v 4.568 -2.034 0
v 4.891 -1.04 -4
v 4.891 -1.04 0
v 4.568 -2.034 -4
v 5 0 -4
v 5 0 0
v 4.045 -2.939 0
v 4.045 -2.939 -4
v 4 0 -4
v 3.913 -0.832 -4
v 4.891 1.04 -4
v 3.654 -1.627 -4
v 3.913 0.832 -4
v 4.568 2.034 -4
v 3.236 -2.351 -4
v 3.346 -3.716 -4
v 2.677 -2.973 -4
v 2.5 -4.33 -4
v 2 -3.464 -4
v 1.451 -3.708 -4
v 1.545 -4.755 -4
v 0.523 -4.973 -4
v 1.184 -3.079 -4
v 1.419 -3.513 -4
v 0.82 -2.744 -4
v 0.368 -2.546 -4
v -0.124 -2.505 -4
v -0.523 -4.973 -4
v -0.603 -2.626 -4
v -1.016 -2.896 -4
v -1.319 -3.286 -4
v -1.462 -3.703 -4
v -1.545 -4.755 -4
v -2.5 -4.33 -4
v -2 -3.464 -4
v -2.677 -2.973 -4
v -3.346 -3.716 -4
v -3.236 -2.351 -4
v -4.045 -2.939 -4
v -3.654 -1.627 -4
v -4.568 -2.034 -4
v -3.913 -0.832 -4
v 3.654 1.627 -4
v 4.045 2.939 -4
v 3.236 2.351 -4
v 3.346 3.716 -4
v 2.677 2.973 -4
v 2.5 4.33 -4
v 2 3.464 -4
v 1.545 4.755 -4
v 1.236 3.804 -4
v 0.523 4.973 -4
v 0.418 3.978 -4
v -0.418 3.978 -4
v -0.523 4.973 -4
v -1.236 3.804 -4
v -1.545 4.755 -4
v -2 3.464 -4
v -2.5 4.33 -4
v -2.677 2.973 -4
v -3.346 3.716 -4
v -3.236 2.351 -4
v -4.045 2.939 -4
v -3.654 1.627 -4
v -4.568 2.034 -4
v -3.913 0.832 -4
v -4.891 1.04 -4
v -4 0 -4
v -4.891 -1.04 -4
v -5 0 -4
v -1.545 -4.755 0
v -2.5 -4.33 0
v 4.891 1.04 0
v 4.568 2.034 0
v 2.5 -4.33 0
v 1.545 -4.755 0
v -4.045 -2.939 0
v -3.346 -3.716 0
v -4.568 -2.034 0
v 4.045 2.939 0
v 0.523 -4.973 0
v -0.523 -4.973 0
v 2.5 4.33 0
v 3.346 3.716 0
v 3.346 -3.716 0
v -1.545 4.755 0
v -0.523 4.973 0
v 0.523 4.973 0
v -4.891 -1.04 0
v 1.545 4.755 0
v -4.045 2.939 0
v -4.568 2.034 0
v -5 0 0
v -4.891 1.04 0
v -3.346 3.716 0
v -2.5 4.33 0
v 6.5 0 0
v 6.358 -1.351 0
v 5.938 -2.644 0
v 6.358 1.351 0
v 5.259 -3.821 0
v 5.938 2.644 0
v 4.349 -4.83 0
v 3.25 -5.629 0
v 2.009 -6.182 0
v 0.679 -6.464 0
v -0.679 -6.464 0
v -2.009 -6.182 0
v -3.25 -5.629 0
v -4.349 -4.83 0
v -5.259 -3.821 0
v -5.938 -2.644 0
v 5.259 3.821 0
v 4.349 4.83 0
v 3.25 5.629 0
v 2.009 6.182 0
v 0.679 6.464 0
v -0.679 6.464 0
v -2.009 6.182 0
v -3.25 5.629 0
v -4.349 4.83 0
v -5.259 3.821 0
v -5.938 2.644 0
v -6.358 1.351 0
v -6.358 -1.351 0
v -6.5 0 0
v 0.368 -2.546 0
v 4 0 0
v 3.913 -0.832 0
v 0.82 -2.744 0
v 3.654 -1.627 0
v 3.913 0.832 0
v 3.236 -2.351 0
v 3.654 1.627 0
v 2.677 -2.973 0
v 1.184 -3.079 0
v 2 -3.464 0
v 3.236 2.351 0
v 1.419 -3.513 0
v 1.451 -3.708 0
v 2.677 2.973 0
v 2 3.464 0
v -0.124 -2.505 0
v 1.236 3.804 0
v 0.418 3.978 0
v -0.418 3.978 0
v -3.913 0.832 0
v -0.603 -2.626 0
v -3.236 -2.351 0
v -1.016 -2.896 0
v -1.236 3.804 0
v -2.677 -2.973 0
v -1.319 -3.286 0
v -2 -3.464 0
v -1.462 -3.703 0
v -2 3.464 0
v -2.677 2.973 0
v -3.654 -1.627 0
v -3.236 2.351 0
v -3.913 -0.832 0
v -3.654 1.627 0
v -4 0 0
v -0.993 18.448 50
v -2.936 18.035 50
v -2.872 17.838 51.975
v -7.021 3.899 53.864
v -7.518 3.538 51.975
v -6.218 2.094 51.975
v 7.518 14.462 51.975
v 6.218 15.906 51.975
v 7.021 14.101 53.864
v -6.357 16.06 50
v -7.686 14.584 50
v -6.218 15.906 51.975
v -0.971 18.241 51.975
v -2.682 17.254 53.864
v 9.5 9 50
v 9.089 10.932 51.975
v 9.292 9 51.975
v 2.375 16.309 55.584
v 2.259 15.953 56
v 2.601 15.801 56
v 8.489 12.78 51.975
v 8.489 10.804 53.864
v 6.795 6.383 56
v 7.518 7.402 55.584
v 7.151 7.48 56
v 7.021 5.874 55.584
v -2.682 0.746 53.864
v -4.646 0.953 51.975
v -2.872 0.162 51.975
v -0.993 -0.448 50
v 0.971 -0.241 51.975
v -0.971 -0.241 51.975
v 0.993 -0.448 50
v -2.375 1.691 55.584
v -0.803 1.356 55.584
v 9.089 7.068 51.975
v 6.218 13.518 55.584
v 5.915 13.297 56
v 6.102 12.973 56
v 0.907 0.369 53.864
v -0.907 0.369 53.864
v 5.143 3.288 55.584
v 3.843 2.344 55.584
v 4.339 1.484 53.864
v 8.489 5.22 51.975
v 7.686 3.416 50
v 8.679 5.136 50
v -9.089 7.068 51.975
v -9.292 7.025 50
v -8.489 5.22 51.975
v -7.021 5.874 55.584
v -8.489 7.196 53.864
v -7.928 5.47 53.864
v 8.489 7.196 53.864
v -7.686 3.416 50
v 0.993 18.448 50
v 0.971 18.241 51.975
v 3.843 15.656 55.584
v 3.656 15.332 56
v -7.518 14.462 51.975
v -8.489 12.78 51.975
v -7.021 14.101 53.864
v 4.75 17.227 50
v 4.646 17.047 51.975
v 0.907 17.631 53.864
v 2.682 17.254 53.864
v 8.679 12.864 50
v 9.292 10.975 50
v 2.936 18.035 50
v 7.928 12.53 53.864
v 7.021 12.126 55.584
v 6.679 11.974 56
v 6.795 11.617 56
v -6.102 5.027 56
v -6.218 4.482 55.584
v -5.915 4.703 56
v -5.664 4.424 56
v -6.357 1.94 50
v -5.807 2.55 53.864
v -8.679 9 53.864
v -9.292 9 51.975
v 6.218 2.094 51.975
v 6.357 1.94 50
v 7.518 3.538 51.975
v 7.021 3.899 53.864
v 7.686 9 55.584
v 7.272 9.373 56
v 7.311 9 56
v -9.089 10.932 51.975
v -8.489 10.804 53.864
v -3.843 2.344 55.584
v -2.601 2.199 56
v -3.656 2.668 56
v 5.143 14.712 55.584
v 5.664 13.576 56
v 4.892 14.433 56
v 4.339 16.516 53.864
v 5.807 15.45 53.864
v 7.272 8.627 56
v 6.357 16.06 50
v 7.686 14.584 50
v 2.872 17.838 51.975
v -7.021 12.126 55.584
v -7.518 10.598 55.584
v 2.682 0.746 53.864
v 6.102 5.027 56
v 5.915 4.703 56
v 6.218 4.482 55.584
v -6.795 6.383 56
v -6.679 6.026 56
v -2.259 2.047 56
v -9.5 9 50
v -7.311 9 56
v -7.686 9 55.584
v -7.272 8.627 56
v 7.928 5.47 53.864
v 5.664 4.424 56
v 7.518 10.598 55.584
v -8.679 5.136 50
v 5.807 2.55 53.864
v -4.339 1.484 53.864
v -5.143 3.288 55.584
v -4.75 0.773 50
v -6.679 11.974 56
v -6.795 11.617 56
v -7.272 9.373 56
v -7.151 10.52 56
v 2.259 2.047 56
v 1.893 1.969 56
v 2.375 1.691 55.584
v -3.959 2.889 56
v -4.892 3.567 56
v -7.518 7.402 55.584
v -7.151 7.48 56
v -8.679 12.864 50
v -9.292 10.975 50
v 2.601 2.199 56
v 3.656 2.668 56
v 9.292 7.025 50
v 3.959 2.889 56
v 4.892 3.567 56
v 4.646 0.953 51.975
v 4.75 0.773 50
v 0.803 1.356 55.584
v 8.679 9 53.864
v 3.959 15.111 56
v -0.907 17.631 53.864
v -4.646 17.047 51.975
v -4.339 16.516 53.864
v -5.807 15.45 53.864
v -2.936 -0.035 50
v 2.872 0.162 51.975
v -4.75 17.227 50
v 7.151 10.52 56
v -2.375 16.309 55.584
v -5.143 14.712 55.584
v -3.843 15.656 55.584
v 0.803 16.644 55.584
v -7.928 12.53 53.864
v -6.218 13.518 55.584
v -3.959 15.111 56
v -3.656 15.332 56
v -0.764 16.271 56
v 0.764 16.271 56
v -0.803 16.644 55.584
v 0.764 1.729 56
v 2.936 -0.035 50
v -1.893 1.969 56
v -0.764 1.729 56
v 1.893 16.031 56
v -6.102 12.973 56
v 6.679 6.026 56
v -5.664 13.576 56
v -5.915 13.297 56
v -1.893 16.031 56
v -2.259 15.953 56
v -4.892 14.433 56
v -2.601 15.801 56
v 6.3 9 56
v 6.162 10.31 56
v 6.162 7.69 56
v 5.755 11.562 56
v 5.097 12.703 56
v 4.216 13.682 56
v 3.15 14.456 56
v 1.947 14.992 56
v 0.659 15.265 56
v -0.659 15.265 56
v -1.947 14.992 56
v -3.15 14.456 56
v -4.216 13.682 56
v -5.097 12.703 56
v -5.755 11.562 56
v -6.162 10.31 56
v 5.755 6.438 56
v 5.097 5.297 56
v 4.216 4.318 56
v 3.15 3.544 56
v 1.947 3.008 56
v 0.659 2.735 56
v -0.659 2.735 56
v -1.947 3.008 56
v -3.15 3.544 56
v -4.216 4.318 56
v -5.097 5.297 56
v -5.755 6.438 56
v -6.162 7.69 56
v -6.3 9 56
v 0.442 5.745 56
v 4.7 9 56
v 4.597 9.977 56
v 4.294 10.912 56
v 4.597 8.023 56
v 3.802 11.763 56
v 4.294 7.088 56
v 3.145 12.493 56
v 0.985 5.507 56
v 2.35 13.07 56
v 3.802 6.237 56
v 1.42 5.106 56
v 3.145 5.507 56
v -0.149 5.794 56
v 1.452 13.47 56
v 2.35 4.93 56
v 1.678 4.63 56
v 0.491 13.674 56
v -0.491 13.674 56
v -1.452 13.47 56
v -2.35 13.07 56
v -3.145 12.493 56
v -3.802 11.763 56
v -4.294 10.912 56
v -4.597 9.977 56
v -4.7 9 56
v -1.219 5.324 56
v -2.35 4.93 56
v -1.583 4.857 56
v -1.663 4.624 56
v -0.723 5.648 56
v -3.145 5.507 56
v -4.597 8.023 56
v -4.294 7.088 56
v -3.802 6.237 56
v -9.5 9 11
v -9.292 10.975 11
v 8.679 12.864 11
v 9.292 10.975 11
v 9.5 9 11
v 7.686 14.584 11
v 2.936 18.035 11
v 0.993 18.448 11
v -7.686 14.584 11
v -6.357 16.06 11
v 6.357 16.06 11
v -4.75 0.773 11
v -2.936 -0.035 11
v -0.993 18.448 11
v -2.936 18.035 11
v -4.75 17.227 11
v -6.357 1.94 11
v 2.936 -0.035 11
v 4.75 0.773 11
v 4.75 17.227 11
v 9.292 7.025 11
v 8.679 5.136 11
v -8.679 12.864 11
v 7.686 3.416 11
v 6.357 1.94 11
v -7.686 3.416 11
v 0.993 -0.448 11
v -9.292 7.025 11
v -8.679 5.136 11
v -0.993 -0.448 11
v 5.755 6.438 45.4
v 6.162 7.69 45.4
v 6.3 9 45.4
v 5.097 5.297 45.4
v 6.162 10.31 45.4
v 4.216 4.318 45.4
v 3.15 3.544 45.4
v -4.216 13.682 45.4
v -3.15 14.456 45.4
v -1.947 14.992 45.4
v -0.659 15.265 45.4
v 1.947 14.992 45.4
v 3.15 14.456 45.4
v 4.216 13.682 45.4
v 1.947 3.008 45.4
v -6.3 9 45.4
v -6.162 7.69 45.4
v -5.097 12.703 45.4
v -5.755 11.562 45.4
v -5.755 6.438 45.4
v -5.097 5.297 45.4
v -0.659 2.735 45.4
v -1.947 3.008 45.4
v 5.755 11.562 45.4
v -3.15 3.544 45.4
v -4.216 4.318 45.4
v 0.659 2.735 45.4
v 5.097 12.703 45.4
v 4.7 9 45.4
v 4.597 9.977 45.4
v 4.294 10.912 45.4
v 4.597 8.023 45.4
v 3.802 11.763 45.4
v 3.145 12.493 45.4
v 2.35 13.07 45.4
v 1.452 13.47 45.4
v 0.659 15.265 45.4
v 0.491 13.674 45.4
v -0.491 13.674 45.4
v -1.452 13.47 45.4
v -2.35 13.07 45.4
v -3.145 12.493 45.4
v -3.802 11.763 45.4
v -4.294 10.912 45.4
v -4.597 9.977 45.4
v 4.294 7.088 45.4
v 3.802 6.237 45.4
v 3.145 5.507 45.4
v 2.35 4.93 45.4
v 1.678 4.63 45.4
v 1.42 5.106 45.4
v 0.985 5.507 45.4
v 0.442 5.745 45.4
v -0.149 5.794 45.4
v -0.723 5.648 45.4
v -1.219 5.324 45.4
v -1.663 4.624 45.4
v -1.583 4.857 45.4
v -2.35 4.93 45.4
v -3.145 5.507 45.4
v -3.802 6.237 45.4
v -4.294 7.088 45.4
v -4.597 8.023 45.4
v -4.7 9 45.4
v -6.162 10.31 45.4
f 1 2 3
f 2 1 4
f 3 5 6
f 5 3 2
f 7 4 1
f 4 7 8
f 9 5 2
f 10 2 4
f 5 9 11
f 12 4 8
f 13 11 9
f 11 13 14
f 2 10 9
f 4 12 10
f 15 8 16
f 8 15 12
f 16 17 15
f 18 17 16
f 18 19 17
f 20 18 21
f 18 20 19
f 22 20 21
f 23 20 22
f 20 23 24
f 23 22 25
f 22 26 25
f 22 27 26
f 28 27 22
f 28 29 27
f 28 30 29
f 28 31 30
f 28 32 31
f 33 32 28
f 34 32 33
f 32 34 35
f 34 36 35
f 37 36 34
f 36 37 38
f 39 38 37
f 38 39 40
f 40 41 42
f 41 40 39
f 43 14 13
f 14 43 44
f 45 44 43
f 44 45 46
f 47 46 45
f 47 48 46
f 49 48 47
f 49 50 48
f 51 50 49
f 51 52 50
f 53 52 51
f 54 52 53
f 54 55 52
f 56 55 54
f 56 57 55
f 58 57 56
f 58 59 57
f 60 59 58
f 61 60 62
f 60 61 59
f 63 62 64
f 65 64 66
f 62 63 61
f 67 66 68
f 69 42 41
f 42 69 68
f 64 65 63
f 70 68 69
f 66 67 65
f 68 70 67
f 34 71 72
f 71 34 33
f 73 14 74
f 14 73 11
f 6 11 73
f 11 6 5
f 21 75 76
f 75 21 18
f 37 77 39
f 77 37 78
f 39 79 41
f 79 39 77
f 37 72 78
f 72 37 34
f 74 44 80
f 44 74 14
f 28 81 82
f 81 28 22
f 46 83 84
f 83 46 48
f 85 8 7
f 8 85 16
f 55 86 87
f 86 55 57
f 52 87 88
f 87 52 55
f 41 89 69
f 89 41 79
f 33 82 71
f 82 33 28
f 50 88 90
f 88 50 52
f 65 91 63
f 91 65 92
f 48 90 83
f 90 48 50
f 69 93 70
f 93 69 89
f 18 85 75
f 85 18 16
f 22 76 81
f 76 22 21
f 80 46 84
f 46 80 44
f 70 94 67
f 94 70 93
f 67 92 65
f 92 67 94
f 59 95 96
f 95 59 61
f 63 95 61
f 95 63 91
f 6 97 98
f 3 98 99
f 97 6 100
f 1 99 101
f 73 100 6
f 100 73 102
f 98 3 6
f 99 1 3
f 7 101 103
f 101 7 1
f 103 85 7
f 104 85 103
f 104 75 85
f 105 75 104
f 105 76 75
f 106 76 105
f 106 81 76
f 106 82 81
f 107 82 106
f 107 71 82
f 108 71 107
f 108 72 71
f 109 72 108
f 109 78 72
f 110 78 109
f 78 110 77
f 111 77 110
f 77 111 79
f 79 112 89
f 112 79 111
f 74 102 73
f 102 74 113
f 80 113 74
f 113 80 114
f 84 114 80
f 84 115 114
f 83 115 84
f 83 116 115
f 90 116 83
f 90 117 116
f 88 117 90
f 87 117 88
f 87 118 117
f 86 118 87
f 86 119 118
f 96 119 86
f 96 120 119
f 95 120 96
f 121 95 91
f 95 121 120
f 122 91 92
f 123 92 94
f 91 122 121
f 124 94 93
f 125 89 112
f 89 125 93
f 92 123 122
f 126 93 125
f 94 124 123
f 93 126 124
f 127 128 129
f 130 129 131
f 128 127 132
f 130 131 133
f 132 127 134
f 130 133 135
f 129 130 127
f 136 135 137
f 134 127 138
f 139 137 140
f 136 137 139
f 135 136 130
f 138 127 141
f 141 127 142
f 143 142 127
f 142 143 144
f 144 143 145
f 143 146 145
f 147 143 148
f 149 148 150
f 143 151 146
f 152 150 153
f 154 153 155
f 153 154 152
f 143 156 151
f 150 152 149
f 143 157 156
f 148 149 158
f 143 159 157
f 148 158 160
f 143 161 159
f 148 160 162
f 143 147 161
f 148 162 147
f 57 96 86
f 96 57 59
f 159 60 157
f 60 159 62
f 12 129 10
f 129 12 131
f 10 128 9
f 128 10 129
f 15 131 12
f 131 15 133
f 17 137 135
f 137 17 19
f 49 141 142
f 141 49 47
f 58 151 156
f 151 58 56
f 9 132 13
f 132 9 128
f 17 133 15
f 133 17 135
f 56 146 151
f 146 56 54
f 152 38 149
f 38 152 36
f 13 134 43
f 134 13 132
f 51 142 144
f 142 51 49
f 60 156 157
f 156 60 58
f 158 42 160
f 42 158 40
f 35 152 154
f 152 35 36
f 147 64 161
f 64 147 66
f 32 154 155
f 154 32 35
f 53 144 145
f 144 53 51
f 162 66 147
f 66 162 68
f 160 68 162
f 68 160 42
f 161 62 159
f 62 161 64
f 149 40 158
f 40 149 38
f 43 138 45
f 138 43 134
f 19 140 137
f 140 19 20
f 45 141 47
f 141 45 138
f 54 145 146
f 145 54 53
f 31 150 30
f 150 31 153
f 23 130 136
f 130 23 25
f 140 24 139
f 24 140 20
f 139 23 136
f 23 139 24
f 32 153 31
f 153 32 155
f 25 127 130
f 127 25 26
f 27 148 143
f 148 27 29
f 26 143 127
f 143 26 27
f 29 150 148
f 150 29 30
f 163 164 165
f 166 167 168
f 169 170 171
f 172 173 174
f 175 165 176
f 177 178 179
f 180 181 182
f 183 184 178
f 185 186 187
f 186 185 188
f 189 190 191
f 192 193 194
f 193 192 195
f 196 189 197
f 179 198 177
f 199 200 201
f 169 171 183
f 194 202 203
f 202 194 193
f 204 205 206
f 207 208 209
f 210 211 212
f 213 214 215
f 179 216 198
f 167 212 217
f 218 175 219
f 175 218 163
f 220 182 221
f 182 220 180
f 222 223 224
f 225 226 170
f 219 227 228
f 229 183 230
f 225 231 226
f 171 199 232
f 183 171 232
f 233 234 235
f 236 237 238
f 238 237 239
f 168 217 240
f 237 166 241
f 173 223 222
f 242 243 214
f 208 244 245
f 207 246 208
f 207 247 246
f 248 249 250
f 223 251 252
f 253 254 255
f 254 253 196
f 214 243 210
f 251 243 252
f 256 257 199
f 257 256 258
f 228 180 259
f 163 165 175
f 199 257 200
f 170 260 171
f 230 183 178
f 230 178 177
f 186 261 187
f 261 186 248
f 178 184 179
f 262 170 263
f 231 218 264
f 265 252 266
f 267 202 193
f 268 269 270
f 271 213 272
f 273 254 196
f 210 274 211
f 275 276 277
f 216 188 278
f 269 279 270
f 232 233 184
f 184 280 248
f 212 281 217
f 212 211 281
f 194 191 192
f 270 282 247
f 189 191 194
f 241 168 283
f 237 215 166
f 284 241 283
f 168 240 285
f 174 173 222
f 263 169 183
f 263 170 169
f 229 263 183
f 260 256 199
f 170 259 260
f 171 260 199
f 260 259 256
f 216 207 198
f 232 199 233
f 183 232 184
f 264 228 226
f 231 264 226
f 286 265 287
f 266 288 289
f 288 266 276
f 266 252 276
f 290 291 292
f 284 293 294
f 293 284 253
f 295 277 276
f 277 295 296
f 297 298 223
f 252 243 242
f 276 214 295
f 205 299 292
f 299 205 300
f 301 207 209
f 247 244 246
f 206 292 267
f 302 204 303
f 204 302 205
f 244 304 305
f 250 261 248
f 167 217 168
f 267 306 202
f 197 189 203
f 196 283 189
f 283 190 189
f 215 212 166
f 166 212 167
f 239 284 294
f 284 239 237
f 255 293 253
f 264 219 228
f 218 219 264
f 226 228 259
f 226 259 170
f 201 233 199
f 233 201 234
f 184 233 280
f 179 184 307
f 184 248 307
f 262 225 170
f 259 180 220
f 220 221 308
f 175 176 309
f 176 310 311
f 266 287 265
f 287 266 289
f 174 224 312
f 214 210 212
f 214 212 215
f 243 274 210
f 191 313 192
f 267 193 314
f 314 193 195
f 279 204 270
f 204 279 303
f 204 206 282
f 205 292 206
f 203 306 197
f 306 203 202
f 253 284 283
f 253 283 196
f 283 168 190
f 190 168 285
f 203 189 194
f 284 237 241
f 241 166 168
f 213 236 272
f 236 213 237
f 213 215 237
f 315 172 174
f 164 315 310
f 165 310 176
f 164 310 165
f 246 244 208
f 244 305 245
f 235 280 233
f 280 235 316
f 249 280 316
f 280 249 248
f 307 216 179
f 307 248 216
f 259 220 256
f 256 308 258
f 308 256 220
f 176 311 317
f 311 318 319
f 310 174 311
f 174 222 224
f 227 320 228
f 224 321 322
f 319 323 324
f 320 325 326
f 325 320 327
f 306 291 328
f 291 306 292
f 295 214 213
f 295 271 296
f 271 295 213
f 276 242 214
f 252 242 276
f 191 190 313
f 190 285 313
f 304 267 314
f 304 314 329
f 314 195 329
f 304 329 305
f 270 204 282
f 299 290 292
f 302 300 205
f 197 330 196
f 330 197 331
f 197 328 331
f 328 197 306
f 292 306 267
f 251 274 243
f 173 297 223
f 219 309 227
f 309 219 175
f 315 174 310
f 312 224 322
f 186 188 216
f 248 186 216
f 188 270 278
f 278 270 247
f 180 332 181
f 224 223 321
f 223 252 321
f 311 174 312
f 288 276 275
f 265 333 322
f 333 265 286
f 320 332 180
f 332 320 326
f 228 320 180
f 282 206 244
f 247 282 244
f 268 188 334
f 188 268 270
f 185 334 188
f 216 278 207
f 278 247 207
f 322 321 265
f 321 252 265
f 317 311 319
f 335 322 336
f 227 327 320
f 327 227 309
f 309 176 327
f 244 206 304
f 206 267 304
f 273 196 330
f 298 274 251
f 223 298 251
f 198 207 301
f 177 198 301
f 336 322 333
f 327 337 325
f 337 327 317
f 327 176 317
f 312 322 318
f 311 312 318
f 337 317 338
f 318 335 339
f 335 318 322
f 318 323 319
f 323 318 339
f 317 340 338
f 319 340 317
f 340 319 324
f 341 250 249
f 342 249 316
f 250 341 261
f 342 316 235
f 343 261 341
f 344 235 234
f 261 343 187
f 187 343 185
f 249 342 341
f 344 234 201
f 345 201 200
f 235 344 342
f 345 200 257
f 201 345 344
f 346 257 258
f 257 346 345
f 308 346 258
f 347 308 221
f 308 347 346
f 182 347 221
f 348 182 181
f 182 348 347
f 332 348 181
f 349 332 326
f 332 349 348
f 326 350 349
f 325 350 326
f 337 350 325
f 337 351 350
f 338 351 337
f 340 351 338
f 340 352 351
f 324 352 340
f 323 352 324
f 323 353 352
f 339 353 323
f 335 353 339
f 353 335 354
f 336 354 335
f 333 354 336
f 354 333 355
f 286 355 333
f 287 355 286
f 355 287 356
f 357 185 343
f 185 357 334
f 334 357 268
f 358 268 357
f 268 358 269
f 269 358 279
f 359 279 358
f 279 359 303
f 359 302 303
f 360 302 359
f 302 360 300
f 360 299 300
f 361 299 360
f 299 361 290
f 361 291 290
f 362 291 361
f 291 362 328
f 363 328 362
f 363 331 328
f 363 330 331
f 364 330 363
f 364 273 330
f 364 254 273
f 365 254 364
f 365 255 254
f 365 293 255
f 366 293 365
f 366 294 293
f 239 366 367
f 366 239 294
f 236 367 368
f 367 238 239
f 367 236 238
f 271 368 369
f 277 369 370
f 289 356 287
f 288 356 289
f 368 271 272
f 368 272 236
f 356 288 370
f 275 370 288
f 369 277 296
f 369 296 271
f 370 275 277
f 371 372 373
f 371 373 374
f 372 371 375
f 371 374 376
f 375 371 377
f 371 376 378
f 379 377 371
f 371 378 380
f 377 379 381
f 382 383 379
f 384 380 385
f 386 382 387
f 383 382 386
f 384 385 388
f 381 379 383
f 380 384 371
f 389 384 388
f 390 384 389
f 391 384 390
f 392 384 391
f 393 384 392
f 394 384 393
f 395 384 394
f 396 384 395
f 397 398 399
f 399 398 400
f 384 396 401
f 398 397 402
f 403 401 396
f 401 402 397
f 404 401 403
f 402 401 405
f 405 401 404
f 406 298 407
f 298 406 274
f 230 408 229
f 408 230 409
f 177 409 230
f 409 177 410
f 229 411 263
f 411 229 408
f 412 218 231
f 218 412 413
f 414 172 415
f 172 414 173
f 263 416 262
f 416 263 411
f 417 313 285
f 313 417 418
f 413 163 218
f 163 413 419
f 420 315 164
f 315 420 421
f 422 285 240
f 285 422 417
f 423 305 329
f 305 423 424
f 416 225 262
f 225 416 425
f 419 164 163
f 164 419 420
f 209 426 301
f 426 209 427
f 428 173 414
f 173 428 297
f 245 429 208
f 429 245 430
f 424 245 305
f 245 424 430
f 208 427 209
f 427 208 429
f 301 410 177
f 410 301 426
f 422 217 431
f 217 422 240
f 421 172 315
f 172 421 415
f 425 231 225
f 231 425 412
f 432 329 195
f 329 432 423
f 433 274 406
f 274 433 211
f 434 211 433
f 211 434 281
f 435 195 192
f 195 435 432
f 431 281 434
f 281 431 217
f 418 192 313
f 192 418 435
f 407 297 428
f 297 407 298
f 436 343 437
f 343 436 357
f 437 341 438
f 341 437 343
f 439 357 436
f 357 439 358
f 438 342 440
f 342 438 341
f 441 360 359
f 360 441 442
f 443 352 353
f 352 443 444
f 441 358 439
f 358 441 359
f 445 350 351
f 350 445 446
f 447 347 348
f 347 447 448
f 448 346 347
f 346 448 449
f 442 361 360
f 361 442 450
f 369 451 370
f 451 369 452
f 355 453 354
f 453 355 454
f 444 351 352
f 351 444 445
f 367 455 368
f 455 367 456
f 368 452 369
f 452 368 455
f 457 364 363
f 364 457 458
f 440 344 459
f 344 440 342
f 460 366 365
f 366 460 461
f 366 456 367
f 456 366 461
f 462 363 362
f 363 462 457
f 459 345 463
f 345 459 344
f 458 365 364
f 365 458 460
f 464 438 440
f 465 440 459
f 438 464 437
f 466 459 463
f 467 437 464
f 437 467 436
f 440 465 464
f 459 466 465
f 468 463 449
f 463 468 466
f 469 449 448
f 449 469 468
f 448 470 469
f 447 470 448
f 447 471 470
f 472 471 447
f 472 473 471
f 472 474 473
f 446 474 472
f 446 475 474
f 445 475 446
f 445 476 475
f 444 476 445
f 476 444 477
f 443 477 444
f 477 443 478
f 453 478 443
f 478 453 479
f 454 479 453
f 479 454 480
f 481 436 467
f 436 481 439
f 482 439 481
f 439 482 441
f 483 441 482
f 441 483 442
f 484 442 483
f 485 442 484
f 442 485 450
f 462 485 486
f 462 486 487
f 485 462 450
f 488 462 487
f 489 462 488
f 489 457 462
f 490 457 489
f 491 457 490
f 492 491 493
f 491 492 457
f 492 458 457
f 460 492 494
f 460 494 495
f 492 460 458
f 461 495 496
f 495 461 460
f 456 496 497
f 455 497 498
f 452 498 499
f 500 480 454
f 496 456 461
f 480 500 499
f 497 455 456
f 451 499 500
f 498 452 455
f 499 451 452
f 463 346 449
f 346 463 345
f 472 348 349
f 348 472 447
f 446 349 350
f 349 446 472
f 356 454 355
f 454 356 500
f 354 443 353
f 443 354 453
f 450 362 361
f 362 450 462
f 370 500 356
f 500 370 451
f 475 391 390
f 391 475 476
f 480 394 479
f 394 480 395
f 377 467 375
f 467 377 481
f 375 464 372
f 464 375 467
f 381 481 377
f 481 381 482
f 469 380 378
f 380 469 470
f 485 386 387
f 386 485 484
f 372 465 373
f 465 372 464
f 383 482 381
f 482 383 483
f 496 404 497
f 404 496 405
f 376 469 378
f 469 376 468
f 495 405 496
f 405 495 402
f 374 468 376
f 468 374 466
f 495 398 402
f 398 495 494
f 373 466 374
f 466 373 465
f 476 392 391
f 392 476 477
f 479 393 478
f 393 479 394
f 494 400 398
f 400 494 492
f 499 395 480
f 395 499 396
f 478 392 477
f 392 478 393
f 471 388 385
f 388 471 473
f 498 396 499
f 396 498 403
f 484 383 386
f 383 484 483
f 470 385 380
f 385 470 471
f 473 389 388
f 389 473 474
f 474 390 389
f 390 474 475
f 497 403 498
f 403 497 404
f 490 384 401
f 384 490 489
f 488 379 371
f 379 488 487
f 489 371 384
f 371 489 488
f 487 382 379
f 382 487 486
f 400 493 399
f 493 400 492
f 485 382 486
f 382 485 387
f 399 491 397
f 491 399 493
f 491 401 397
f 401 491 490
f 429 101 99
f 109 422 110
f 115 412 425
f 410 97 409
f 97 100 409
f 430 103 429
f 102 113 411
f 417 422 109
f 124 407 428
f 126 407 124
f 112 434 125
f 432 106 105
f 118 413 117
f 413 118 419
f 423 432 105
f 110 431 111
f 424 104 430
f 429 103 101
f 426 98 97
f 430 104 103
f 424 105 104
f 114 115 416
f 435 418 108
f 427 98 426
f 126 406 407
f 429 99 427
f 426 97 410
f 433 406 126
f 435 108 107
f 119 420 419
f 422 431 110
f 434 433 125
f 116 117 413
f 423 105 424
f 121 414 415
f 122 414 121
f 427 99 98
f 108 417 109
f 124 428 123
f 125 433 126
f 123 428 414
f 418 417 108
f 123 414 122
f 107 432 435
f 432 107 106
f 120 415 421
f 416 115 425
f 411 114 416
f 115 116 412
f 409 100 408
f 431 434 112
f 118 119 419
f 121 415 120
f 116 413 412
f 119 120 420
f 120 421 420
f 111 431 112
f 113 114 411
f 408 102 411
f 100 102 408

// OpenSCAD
// file: ../../connectors/notched_circle/constants.scad
connectors_notched_circle_thickness = 2;
connectors_notched_circle_notch_diameter = 3;
connectors_notched_circle_loose_length = 1;
connectors_notched_circle_loose_to_tight_length = 1;
// file: ../../connectors/notched_circle/female.scad
include <../../settings.scad>;
use <../../utilities/cylinders.scad>;
include <constants.scad>;

// Renders the female counterpart of a circular connector with an orienting
// notch.  Place on the surface oriented so that Z- is the surface normal.
module connectors_notched_circle_female(
    // The outer diameter of the compatible male circle.
    diameter,
    // The length of the male compatible circle.
    length
) {
  union() {
    difference() {
      cylinder(
        d = diameter + tight_tolerance,
        h = length + tight_tolerance,
        $fn = cylinder_sides(diameter)
      );
      cylinder(
        d = diameter - connectors_notched_circle_thickness - tight_tolerance,
        h = length + tight_tolerance,
        $fn = cylinder_sides(diameter)
      );
    };
    intersection() {
      translate([
        0,
        diameter / 2 - connectors_notched_circle_thickness / 2,
        0
      ]) {
        cylinder(
          d = connectors_notched_circle_notch_diameter + tight_tolerance,
          h = length + tight_tolerance,
          $fn = cylinder_sides(connectors_notched_circle_notch_diameter)
        );
      };
      cylinder(
        d = diameter + tight_tolerance,
        h = length + tight_tolerance,
        $fn = cylinder_sides(diameter)
      );
    };
  };
};

difference() {
  cube([10, 10, 7]);

  translate([5, 5, 7.001]) {
    rotate([180, 0, 0]) {
      connectors_notched_circle_female(6, 5);
    }
  };
};
// file: ../../connectors/notched_circle/male.scad
include <../../settings.scad>;
use <../../utilities/cylinders.scad>;
include <constants.scad>;

// Renders the male counterpart of a circular connector with an orienting notch.
// Place on the surface oriented so that Z+ is the surface normal.
module connectors_notched_circle_male(
    // The outer diameter of the male circle.
    diameter,
    // The length of the male circle.
    length
) {
  union() {
    difference() {
      cylinder(
        d = diameter,
        h = length,
        $fn = cylinder_sides(diameter)
      );
      cylinder(
        d = diameter - connectors_notched_circle_thickness,
        h = length,
        $fn = cylinder_sides(diameter)
      );
    };
    intersection() {
      translate([
        0,
        diameter / 2 - connectors_notched_circle_thickness / 2,
        0
      ]) {
        cylinder(
          d = connectors_notched_circle_notch_diameter,
          h = length,
          $fn = cylinder_sides(connectors_notched_circle_notch_diameter)
        );
      };
      cylinder(
        d = diameter,
        h = length,
        $fn = cylinder_sides(diameter)
      );
    };
  };
};
// file: ../../utilities/cylinders.scad
// Calculates the $fn which should be used for a cylinder of a specific size.
function cylinder_sides(
  // The diameter of the cylinder.
  diameter
) = ceil(
  max(
    min(
      360 / $fa,
      diameter * PI / $fs
    ),
    8
  )
);

// Generates a grid of square perforations through a cylinder of a specific
// size.
module cylinder_perforations(
  // The diameter of the cylinder.
  diameter,
  // The height of the cylinder.
  length,
  // The size (width/height) of each perforation.
  perforation_size,
  // The target spacing between perforations.  This will be adjusted to fit
  // evenly on the cylinder.
  perforation_spacing
) {
  half_perimeter = diameter * PI / 2;
  angularPerforations = round(half_perimeter / perforation_spacing);
  zPerforations = round(length / perforation_spacing);
  for (angle = [0:180 / angularPerforations:180]) {
    rotate([0, 0, angle]) {
      for (z = [(length / zPerforations) * 0.5:length / zPerforations:length - (length / zPerforations) * 0.5]) {
        translate([0, 0, z]) {
          cube([diameter, perforation_size, perforation_size], center = true);
        };
      }
    };
  };
};

// Generates a "pipe" which lofts a sequence of circles together.
module cylinder_sequence(
  // The diameter of the first circle.
  initial_diameter,
  // An array of arrays, where each child array is two numbers:
  // - The length of the segment along Z.
  // - The diameter of the end of the segment.
  length_diameter_pairs,
  // The number of sides of all circles drawn.
  sides,
  // Used for recursion; leave as default.
  i = 0
) {
  if (i < len(length_diameter_pairs)) {
    cylinder(
      d1 = initial_diameter,
      d2 = length_diameter_pairs[i][1],
      h = length_diameter_pairs[i][0],
      $fn = sides
    );
    translate([
      0,
      0,
      length_diameter_pairs[i][0]
    ]) {
      cylinder_sequence(
        length_diameter_pairs[i][1],
        length_diameter_pairs,
        sides,
        i + 1
      );
    };
  };
};
// file: skew.scad
include <../../settings.scad>;
use <../../utilities/cylinders.scad>;
use <../../connectors/notched_circle/male.scad>;
use <../../connectors/notched_circle/female.scad>;
include <measurements.scad>;

module hero_dualie_fore_skew() {
  // The connector to the glow.
  rotate([180, 0, 0]) {
    connectors_notched_circle_male(
      hero_dualie_fore_glow_skew_connector_diameter,
      hero_dualie_fore_glow_skew_connector_length,
      hero_dualie_fore_glow_skew_connector_notches
    );
  };
    
  // The skewed section.
  multmatrix([
    [1, 0, 0, 0],
    [0, 1, hero_dualie_fore_skew / hero_dualie_fore_skew_length, 0],
    [0, 0, 1, 0],
    [0, 0, 0, 1]
  ]) {
    cylinder(
      d1 = hero_dualie_fore_skew_diameter,
      d2 = hero_dualie_fore_diameter,
      h = hero_dualie_fore_skew_length,
      $fn = cylinder_sides(hero_dualie_fore_diameter)
    );
  };
  
  difference() {
    union() {
      // The cylindrical shaft. 
      translate([
        0,
        hero_dualie_fore_skew,
        hero_dualie_fore_skew_length
      ]) {
        cylinder(
          d = hero_dualie_fore_diameter,
          h = hero_dualie_fore_length,
          $fn = cylinder_sides(hero_dualie_fore_diameter)
        );
      };
      
      // The rounding before the nut.
      translate([
        0,
        hero_dualie_fore_skew,
        hero_dualie_fore_skew_length + hero_dualie_fore_length
      ]) {
        intersection() {
          sphere(
            d = hero_dualie_fore_diameter,
            $fn = cylinder_sides(hero_dualie_fore_diameter)
          );
          translate([
            hero_dualie_fore_diameter / -2,
            hero_dualie_fore_diameter / -2,
            0
          ]) {
            cube([
              hero_dualie_fore_diameter,
              hero_dualie_fore_diameter,
              hero_dualie_fore_funnel_length
            ]);
          };
        };
      };
    };
    
    // The connector to the nut.
    translate([
      0,
      hero_dualie_fore_skew,
      hero_dualie_fore_skew_length + hero_dualie_fore_length + hero_dualie_fore_funnel_length + 0.001
    ]) {
      rotate([180, 0, 0]) {
        connectors_notched_circle_female(
          hero_dualie_fore_nut_connector_diameter,
          hero_dualie_fore_nut_connector_length + 0.001,
          hero_dualie_fore_nut_connector_notches
        );
      };
    };
  };
};
// file: measurements.scad
hero_dualie_fore_x = 4;
hero_dualie_fore_y = 28;
hero_dualie_fore_angle = 6.53;
hero_dualie_fore_glow_ring_diameter = 23;
hero_dualie_fore_glow_ring_length = 19;
hero_dualie_fore_glow_ring_wall_thickness = 1;
hero_dualie_fore_glow_ring_floor_ceiling_thickness = 1.5;
hero_dualie_fore_glow_pillar_x = 5;
hero_dualie_fore_glow_pillar_y = -3;
hero_dualie_fore_glow_pillar_angle = 30;
hero_dualie_fore_glow_pillar_diameter = 12;
hero_dualie_fore_glow_pillar_length = 12;
hero_dualie_fore_glow_pillar_wall_thickness = 1;
hero_dualie_fore_glow_pillar_floor_ceiling_thickness = 1.5;
hero_dualie_fore_glow_pillar_connector_length = 5;
hero_dualie_fore_glow_pillar_connector_notches = 1;
hero_dualie_fore_glow_wedge_a_x = 8;
hero_dualie_fore_glow_wedge_a_y = 12.5;
hero_dualie_fore_glow_wedge_b_x = 26;
hero_dualie_fore_glow_wedge_b_y = 15;
hero_dualie_fore_glow_wedge_c_x = 9;
hero_dualie_fore_glow_wedge_c_y = 35;
hero_dualie_fore_glow_wedge_d_x = 7;
hero_dualie_fore_glow_wedge_d_y = 17;
hero_dualie_fore_glow_wedge_cutout_a_x = 9.5;
hero_dualie_fore_glow_wedge_cutout_a_y = 12;
hero_dualie_fore_glow_wedge_cutout_b_x = 24.5;
hero_dualie_fore_glow_wedge_cutout_b_y = 14;
hero_dualie_fore_glow_wedge_cutout_c_x = 8;
hero_dualie_fore_glow_wedge_cutout_c_y = 33;
hero_dualie_fore_glow_wedge_cutout_d_x = 7;
hero_dualie_fore_glow_wedge_cutout_d_y = 21;
hero_dualie_fore_glow_wedge_thickness = 6;
hero_dualie_fore_glow_wedge_wall_thickness = 1.5;

hero_dualie_fore_glow_skew_connector_diameter = 10;
hero_dualie_fore_glow_skew_connector_length = 4;
hero_dualie_fore_glow_skew_connector_notches = 1;

hero_dualie_fore_skew = 9;
hero_dualie_fore_skew_diameter = 13;
hero_dualie_fore_skew_length = 11;
hero_dualie_fore_diameter = 19;
hero_dualie_fore_length = 39;
hero_dualie_fore_funnel_length = 6;

hero_dualie_fore_nut_connector_diameter = 12;
hero_dualie_fore_nut_connector_length = 10;
hero_dualie_fore_nut_connector_notches = 3;

hero_dualie_fore_nut_diameter = 18;
hero_dualie_fore_nut_length = 9;
hero_dualie_fore_nut_sides = 6;
hero_dualie_fore_nut_horizontal_radiusing = 0.52;
hero_dualie_fore_nut_vertical_radiusing = 1;
// file: ../../settings.scad
// When true, lower resolution primitives will be used.
draft = false;

$fs = draft ? 1 : 0.5;

// The amount of space left between parts which must fit together tightly.
tight_tolerance = 0.6;

// The amount of space left between parts which must fit together loosely.
loose_tolerance = 1;

// Calculates the $fn which should be used for a cylinder of a specific size.
function cylinder_sides(
  // The diameter of the cylinder.
  diameter
) = ceil(
  max(
    min(
      360 / $fa,
      diameter * PI / $fs
    ),
    8
  )
);
// main file
include <../../settings.scad>;
include <measurements.scad>;
use <skew.scad>;

hero_dualie_fore_skew();
